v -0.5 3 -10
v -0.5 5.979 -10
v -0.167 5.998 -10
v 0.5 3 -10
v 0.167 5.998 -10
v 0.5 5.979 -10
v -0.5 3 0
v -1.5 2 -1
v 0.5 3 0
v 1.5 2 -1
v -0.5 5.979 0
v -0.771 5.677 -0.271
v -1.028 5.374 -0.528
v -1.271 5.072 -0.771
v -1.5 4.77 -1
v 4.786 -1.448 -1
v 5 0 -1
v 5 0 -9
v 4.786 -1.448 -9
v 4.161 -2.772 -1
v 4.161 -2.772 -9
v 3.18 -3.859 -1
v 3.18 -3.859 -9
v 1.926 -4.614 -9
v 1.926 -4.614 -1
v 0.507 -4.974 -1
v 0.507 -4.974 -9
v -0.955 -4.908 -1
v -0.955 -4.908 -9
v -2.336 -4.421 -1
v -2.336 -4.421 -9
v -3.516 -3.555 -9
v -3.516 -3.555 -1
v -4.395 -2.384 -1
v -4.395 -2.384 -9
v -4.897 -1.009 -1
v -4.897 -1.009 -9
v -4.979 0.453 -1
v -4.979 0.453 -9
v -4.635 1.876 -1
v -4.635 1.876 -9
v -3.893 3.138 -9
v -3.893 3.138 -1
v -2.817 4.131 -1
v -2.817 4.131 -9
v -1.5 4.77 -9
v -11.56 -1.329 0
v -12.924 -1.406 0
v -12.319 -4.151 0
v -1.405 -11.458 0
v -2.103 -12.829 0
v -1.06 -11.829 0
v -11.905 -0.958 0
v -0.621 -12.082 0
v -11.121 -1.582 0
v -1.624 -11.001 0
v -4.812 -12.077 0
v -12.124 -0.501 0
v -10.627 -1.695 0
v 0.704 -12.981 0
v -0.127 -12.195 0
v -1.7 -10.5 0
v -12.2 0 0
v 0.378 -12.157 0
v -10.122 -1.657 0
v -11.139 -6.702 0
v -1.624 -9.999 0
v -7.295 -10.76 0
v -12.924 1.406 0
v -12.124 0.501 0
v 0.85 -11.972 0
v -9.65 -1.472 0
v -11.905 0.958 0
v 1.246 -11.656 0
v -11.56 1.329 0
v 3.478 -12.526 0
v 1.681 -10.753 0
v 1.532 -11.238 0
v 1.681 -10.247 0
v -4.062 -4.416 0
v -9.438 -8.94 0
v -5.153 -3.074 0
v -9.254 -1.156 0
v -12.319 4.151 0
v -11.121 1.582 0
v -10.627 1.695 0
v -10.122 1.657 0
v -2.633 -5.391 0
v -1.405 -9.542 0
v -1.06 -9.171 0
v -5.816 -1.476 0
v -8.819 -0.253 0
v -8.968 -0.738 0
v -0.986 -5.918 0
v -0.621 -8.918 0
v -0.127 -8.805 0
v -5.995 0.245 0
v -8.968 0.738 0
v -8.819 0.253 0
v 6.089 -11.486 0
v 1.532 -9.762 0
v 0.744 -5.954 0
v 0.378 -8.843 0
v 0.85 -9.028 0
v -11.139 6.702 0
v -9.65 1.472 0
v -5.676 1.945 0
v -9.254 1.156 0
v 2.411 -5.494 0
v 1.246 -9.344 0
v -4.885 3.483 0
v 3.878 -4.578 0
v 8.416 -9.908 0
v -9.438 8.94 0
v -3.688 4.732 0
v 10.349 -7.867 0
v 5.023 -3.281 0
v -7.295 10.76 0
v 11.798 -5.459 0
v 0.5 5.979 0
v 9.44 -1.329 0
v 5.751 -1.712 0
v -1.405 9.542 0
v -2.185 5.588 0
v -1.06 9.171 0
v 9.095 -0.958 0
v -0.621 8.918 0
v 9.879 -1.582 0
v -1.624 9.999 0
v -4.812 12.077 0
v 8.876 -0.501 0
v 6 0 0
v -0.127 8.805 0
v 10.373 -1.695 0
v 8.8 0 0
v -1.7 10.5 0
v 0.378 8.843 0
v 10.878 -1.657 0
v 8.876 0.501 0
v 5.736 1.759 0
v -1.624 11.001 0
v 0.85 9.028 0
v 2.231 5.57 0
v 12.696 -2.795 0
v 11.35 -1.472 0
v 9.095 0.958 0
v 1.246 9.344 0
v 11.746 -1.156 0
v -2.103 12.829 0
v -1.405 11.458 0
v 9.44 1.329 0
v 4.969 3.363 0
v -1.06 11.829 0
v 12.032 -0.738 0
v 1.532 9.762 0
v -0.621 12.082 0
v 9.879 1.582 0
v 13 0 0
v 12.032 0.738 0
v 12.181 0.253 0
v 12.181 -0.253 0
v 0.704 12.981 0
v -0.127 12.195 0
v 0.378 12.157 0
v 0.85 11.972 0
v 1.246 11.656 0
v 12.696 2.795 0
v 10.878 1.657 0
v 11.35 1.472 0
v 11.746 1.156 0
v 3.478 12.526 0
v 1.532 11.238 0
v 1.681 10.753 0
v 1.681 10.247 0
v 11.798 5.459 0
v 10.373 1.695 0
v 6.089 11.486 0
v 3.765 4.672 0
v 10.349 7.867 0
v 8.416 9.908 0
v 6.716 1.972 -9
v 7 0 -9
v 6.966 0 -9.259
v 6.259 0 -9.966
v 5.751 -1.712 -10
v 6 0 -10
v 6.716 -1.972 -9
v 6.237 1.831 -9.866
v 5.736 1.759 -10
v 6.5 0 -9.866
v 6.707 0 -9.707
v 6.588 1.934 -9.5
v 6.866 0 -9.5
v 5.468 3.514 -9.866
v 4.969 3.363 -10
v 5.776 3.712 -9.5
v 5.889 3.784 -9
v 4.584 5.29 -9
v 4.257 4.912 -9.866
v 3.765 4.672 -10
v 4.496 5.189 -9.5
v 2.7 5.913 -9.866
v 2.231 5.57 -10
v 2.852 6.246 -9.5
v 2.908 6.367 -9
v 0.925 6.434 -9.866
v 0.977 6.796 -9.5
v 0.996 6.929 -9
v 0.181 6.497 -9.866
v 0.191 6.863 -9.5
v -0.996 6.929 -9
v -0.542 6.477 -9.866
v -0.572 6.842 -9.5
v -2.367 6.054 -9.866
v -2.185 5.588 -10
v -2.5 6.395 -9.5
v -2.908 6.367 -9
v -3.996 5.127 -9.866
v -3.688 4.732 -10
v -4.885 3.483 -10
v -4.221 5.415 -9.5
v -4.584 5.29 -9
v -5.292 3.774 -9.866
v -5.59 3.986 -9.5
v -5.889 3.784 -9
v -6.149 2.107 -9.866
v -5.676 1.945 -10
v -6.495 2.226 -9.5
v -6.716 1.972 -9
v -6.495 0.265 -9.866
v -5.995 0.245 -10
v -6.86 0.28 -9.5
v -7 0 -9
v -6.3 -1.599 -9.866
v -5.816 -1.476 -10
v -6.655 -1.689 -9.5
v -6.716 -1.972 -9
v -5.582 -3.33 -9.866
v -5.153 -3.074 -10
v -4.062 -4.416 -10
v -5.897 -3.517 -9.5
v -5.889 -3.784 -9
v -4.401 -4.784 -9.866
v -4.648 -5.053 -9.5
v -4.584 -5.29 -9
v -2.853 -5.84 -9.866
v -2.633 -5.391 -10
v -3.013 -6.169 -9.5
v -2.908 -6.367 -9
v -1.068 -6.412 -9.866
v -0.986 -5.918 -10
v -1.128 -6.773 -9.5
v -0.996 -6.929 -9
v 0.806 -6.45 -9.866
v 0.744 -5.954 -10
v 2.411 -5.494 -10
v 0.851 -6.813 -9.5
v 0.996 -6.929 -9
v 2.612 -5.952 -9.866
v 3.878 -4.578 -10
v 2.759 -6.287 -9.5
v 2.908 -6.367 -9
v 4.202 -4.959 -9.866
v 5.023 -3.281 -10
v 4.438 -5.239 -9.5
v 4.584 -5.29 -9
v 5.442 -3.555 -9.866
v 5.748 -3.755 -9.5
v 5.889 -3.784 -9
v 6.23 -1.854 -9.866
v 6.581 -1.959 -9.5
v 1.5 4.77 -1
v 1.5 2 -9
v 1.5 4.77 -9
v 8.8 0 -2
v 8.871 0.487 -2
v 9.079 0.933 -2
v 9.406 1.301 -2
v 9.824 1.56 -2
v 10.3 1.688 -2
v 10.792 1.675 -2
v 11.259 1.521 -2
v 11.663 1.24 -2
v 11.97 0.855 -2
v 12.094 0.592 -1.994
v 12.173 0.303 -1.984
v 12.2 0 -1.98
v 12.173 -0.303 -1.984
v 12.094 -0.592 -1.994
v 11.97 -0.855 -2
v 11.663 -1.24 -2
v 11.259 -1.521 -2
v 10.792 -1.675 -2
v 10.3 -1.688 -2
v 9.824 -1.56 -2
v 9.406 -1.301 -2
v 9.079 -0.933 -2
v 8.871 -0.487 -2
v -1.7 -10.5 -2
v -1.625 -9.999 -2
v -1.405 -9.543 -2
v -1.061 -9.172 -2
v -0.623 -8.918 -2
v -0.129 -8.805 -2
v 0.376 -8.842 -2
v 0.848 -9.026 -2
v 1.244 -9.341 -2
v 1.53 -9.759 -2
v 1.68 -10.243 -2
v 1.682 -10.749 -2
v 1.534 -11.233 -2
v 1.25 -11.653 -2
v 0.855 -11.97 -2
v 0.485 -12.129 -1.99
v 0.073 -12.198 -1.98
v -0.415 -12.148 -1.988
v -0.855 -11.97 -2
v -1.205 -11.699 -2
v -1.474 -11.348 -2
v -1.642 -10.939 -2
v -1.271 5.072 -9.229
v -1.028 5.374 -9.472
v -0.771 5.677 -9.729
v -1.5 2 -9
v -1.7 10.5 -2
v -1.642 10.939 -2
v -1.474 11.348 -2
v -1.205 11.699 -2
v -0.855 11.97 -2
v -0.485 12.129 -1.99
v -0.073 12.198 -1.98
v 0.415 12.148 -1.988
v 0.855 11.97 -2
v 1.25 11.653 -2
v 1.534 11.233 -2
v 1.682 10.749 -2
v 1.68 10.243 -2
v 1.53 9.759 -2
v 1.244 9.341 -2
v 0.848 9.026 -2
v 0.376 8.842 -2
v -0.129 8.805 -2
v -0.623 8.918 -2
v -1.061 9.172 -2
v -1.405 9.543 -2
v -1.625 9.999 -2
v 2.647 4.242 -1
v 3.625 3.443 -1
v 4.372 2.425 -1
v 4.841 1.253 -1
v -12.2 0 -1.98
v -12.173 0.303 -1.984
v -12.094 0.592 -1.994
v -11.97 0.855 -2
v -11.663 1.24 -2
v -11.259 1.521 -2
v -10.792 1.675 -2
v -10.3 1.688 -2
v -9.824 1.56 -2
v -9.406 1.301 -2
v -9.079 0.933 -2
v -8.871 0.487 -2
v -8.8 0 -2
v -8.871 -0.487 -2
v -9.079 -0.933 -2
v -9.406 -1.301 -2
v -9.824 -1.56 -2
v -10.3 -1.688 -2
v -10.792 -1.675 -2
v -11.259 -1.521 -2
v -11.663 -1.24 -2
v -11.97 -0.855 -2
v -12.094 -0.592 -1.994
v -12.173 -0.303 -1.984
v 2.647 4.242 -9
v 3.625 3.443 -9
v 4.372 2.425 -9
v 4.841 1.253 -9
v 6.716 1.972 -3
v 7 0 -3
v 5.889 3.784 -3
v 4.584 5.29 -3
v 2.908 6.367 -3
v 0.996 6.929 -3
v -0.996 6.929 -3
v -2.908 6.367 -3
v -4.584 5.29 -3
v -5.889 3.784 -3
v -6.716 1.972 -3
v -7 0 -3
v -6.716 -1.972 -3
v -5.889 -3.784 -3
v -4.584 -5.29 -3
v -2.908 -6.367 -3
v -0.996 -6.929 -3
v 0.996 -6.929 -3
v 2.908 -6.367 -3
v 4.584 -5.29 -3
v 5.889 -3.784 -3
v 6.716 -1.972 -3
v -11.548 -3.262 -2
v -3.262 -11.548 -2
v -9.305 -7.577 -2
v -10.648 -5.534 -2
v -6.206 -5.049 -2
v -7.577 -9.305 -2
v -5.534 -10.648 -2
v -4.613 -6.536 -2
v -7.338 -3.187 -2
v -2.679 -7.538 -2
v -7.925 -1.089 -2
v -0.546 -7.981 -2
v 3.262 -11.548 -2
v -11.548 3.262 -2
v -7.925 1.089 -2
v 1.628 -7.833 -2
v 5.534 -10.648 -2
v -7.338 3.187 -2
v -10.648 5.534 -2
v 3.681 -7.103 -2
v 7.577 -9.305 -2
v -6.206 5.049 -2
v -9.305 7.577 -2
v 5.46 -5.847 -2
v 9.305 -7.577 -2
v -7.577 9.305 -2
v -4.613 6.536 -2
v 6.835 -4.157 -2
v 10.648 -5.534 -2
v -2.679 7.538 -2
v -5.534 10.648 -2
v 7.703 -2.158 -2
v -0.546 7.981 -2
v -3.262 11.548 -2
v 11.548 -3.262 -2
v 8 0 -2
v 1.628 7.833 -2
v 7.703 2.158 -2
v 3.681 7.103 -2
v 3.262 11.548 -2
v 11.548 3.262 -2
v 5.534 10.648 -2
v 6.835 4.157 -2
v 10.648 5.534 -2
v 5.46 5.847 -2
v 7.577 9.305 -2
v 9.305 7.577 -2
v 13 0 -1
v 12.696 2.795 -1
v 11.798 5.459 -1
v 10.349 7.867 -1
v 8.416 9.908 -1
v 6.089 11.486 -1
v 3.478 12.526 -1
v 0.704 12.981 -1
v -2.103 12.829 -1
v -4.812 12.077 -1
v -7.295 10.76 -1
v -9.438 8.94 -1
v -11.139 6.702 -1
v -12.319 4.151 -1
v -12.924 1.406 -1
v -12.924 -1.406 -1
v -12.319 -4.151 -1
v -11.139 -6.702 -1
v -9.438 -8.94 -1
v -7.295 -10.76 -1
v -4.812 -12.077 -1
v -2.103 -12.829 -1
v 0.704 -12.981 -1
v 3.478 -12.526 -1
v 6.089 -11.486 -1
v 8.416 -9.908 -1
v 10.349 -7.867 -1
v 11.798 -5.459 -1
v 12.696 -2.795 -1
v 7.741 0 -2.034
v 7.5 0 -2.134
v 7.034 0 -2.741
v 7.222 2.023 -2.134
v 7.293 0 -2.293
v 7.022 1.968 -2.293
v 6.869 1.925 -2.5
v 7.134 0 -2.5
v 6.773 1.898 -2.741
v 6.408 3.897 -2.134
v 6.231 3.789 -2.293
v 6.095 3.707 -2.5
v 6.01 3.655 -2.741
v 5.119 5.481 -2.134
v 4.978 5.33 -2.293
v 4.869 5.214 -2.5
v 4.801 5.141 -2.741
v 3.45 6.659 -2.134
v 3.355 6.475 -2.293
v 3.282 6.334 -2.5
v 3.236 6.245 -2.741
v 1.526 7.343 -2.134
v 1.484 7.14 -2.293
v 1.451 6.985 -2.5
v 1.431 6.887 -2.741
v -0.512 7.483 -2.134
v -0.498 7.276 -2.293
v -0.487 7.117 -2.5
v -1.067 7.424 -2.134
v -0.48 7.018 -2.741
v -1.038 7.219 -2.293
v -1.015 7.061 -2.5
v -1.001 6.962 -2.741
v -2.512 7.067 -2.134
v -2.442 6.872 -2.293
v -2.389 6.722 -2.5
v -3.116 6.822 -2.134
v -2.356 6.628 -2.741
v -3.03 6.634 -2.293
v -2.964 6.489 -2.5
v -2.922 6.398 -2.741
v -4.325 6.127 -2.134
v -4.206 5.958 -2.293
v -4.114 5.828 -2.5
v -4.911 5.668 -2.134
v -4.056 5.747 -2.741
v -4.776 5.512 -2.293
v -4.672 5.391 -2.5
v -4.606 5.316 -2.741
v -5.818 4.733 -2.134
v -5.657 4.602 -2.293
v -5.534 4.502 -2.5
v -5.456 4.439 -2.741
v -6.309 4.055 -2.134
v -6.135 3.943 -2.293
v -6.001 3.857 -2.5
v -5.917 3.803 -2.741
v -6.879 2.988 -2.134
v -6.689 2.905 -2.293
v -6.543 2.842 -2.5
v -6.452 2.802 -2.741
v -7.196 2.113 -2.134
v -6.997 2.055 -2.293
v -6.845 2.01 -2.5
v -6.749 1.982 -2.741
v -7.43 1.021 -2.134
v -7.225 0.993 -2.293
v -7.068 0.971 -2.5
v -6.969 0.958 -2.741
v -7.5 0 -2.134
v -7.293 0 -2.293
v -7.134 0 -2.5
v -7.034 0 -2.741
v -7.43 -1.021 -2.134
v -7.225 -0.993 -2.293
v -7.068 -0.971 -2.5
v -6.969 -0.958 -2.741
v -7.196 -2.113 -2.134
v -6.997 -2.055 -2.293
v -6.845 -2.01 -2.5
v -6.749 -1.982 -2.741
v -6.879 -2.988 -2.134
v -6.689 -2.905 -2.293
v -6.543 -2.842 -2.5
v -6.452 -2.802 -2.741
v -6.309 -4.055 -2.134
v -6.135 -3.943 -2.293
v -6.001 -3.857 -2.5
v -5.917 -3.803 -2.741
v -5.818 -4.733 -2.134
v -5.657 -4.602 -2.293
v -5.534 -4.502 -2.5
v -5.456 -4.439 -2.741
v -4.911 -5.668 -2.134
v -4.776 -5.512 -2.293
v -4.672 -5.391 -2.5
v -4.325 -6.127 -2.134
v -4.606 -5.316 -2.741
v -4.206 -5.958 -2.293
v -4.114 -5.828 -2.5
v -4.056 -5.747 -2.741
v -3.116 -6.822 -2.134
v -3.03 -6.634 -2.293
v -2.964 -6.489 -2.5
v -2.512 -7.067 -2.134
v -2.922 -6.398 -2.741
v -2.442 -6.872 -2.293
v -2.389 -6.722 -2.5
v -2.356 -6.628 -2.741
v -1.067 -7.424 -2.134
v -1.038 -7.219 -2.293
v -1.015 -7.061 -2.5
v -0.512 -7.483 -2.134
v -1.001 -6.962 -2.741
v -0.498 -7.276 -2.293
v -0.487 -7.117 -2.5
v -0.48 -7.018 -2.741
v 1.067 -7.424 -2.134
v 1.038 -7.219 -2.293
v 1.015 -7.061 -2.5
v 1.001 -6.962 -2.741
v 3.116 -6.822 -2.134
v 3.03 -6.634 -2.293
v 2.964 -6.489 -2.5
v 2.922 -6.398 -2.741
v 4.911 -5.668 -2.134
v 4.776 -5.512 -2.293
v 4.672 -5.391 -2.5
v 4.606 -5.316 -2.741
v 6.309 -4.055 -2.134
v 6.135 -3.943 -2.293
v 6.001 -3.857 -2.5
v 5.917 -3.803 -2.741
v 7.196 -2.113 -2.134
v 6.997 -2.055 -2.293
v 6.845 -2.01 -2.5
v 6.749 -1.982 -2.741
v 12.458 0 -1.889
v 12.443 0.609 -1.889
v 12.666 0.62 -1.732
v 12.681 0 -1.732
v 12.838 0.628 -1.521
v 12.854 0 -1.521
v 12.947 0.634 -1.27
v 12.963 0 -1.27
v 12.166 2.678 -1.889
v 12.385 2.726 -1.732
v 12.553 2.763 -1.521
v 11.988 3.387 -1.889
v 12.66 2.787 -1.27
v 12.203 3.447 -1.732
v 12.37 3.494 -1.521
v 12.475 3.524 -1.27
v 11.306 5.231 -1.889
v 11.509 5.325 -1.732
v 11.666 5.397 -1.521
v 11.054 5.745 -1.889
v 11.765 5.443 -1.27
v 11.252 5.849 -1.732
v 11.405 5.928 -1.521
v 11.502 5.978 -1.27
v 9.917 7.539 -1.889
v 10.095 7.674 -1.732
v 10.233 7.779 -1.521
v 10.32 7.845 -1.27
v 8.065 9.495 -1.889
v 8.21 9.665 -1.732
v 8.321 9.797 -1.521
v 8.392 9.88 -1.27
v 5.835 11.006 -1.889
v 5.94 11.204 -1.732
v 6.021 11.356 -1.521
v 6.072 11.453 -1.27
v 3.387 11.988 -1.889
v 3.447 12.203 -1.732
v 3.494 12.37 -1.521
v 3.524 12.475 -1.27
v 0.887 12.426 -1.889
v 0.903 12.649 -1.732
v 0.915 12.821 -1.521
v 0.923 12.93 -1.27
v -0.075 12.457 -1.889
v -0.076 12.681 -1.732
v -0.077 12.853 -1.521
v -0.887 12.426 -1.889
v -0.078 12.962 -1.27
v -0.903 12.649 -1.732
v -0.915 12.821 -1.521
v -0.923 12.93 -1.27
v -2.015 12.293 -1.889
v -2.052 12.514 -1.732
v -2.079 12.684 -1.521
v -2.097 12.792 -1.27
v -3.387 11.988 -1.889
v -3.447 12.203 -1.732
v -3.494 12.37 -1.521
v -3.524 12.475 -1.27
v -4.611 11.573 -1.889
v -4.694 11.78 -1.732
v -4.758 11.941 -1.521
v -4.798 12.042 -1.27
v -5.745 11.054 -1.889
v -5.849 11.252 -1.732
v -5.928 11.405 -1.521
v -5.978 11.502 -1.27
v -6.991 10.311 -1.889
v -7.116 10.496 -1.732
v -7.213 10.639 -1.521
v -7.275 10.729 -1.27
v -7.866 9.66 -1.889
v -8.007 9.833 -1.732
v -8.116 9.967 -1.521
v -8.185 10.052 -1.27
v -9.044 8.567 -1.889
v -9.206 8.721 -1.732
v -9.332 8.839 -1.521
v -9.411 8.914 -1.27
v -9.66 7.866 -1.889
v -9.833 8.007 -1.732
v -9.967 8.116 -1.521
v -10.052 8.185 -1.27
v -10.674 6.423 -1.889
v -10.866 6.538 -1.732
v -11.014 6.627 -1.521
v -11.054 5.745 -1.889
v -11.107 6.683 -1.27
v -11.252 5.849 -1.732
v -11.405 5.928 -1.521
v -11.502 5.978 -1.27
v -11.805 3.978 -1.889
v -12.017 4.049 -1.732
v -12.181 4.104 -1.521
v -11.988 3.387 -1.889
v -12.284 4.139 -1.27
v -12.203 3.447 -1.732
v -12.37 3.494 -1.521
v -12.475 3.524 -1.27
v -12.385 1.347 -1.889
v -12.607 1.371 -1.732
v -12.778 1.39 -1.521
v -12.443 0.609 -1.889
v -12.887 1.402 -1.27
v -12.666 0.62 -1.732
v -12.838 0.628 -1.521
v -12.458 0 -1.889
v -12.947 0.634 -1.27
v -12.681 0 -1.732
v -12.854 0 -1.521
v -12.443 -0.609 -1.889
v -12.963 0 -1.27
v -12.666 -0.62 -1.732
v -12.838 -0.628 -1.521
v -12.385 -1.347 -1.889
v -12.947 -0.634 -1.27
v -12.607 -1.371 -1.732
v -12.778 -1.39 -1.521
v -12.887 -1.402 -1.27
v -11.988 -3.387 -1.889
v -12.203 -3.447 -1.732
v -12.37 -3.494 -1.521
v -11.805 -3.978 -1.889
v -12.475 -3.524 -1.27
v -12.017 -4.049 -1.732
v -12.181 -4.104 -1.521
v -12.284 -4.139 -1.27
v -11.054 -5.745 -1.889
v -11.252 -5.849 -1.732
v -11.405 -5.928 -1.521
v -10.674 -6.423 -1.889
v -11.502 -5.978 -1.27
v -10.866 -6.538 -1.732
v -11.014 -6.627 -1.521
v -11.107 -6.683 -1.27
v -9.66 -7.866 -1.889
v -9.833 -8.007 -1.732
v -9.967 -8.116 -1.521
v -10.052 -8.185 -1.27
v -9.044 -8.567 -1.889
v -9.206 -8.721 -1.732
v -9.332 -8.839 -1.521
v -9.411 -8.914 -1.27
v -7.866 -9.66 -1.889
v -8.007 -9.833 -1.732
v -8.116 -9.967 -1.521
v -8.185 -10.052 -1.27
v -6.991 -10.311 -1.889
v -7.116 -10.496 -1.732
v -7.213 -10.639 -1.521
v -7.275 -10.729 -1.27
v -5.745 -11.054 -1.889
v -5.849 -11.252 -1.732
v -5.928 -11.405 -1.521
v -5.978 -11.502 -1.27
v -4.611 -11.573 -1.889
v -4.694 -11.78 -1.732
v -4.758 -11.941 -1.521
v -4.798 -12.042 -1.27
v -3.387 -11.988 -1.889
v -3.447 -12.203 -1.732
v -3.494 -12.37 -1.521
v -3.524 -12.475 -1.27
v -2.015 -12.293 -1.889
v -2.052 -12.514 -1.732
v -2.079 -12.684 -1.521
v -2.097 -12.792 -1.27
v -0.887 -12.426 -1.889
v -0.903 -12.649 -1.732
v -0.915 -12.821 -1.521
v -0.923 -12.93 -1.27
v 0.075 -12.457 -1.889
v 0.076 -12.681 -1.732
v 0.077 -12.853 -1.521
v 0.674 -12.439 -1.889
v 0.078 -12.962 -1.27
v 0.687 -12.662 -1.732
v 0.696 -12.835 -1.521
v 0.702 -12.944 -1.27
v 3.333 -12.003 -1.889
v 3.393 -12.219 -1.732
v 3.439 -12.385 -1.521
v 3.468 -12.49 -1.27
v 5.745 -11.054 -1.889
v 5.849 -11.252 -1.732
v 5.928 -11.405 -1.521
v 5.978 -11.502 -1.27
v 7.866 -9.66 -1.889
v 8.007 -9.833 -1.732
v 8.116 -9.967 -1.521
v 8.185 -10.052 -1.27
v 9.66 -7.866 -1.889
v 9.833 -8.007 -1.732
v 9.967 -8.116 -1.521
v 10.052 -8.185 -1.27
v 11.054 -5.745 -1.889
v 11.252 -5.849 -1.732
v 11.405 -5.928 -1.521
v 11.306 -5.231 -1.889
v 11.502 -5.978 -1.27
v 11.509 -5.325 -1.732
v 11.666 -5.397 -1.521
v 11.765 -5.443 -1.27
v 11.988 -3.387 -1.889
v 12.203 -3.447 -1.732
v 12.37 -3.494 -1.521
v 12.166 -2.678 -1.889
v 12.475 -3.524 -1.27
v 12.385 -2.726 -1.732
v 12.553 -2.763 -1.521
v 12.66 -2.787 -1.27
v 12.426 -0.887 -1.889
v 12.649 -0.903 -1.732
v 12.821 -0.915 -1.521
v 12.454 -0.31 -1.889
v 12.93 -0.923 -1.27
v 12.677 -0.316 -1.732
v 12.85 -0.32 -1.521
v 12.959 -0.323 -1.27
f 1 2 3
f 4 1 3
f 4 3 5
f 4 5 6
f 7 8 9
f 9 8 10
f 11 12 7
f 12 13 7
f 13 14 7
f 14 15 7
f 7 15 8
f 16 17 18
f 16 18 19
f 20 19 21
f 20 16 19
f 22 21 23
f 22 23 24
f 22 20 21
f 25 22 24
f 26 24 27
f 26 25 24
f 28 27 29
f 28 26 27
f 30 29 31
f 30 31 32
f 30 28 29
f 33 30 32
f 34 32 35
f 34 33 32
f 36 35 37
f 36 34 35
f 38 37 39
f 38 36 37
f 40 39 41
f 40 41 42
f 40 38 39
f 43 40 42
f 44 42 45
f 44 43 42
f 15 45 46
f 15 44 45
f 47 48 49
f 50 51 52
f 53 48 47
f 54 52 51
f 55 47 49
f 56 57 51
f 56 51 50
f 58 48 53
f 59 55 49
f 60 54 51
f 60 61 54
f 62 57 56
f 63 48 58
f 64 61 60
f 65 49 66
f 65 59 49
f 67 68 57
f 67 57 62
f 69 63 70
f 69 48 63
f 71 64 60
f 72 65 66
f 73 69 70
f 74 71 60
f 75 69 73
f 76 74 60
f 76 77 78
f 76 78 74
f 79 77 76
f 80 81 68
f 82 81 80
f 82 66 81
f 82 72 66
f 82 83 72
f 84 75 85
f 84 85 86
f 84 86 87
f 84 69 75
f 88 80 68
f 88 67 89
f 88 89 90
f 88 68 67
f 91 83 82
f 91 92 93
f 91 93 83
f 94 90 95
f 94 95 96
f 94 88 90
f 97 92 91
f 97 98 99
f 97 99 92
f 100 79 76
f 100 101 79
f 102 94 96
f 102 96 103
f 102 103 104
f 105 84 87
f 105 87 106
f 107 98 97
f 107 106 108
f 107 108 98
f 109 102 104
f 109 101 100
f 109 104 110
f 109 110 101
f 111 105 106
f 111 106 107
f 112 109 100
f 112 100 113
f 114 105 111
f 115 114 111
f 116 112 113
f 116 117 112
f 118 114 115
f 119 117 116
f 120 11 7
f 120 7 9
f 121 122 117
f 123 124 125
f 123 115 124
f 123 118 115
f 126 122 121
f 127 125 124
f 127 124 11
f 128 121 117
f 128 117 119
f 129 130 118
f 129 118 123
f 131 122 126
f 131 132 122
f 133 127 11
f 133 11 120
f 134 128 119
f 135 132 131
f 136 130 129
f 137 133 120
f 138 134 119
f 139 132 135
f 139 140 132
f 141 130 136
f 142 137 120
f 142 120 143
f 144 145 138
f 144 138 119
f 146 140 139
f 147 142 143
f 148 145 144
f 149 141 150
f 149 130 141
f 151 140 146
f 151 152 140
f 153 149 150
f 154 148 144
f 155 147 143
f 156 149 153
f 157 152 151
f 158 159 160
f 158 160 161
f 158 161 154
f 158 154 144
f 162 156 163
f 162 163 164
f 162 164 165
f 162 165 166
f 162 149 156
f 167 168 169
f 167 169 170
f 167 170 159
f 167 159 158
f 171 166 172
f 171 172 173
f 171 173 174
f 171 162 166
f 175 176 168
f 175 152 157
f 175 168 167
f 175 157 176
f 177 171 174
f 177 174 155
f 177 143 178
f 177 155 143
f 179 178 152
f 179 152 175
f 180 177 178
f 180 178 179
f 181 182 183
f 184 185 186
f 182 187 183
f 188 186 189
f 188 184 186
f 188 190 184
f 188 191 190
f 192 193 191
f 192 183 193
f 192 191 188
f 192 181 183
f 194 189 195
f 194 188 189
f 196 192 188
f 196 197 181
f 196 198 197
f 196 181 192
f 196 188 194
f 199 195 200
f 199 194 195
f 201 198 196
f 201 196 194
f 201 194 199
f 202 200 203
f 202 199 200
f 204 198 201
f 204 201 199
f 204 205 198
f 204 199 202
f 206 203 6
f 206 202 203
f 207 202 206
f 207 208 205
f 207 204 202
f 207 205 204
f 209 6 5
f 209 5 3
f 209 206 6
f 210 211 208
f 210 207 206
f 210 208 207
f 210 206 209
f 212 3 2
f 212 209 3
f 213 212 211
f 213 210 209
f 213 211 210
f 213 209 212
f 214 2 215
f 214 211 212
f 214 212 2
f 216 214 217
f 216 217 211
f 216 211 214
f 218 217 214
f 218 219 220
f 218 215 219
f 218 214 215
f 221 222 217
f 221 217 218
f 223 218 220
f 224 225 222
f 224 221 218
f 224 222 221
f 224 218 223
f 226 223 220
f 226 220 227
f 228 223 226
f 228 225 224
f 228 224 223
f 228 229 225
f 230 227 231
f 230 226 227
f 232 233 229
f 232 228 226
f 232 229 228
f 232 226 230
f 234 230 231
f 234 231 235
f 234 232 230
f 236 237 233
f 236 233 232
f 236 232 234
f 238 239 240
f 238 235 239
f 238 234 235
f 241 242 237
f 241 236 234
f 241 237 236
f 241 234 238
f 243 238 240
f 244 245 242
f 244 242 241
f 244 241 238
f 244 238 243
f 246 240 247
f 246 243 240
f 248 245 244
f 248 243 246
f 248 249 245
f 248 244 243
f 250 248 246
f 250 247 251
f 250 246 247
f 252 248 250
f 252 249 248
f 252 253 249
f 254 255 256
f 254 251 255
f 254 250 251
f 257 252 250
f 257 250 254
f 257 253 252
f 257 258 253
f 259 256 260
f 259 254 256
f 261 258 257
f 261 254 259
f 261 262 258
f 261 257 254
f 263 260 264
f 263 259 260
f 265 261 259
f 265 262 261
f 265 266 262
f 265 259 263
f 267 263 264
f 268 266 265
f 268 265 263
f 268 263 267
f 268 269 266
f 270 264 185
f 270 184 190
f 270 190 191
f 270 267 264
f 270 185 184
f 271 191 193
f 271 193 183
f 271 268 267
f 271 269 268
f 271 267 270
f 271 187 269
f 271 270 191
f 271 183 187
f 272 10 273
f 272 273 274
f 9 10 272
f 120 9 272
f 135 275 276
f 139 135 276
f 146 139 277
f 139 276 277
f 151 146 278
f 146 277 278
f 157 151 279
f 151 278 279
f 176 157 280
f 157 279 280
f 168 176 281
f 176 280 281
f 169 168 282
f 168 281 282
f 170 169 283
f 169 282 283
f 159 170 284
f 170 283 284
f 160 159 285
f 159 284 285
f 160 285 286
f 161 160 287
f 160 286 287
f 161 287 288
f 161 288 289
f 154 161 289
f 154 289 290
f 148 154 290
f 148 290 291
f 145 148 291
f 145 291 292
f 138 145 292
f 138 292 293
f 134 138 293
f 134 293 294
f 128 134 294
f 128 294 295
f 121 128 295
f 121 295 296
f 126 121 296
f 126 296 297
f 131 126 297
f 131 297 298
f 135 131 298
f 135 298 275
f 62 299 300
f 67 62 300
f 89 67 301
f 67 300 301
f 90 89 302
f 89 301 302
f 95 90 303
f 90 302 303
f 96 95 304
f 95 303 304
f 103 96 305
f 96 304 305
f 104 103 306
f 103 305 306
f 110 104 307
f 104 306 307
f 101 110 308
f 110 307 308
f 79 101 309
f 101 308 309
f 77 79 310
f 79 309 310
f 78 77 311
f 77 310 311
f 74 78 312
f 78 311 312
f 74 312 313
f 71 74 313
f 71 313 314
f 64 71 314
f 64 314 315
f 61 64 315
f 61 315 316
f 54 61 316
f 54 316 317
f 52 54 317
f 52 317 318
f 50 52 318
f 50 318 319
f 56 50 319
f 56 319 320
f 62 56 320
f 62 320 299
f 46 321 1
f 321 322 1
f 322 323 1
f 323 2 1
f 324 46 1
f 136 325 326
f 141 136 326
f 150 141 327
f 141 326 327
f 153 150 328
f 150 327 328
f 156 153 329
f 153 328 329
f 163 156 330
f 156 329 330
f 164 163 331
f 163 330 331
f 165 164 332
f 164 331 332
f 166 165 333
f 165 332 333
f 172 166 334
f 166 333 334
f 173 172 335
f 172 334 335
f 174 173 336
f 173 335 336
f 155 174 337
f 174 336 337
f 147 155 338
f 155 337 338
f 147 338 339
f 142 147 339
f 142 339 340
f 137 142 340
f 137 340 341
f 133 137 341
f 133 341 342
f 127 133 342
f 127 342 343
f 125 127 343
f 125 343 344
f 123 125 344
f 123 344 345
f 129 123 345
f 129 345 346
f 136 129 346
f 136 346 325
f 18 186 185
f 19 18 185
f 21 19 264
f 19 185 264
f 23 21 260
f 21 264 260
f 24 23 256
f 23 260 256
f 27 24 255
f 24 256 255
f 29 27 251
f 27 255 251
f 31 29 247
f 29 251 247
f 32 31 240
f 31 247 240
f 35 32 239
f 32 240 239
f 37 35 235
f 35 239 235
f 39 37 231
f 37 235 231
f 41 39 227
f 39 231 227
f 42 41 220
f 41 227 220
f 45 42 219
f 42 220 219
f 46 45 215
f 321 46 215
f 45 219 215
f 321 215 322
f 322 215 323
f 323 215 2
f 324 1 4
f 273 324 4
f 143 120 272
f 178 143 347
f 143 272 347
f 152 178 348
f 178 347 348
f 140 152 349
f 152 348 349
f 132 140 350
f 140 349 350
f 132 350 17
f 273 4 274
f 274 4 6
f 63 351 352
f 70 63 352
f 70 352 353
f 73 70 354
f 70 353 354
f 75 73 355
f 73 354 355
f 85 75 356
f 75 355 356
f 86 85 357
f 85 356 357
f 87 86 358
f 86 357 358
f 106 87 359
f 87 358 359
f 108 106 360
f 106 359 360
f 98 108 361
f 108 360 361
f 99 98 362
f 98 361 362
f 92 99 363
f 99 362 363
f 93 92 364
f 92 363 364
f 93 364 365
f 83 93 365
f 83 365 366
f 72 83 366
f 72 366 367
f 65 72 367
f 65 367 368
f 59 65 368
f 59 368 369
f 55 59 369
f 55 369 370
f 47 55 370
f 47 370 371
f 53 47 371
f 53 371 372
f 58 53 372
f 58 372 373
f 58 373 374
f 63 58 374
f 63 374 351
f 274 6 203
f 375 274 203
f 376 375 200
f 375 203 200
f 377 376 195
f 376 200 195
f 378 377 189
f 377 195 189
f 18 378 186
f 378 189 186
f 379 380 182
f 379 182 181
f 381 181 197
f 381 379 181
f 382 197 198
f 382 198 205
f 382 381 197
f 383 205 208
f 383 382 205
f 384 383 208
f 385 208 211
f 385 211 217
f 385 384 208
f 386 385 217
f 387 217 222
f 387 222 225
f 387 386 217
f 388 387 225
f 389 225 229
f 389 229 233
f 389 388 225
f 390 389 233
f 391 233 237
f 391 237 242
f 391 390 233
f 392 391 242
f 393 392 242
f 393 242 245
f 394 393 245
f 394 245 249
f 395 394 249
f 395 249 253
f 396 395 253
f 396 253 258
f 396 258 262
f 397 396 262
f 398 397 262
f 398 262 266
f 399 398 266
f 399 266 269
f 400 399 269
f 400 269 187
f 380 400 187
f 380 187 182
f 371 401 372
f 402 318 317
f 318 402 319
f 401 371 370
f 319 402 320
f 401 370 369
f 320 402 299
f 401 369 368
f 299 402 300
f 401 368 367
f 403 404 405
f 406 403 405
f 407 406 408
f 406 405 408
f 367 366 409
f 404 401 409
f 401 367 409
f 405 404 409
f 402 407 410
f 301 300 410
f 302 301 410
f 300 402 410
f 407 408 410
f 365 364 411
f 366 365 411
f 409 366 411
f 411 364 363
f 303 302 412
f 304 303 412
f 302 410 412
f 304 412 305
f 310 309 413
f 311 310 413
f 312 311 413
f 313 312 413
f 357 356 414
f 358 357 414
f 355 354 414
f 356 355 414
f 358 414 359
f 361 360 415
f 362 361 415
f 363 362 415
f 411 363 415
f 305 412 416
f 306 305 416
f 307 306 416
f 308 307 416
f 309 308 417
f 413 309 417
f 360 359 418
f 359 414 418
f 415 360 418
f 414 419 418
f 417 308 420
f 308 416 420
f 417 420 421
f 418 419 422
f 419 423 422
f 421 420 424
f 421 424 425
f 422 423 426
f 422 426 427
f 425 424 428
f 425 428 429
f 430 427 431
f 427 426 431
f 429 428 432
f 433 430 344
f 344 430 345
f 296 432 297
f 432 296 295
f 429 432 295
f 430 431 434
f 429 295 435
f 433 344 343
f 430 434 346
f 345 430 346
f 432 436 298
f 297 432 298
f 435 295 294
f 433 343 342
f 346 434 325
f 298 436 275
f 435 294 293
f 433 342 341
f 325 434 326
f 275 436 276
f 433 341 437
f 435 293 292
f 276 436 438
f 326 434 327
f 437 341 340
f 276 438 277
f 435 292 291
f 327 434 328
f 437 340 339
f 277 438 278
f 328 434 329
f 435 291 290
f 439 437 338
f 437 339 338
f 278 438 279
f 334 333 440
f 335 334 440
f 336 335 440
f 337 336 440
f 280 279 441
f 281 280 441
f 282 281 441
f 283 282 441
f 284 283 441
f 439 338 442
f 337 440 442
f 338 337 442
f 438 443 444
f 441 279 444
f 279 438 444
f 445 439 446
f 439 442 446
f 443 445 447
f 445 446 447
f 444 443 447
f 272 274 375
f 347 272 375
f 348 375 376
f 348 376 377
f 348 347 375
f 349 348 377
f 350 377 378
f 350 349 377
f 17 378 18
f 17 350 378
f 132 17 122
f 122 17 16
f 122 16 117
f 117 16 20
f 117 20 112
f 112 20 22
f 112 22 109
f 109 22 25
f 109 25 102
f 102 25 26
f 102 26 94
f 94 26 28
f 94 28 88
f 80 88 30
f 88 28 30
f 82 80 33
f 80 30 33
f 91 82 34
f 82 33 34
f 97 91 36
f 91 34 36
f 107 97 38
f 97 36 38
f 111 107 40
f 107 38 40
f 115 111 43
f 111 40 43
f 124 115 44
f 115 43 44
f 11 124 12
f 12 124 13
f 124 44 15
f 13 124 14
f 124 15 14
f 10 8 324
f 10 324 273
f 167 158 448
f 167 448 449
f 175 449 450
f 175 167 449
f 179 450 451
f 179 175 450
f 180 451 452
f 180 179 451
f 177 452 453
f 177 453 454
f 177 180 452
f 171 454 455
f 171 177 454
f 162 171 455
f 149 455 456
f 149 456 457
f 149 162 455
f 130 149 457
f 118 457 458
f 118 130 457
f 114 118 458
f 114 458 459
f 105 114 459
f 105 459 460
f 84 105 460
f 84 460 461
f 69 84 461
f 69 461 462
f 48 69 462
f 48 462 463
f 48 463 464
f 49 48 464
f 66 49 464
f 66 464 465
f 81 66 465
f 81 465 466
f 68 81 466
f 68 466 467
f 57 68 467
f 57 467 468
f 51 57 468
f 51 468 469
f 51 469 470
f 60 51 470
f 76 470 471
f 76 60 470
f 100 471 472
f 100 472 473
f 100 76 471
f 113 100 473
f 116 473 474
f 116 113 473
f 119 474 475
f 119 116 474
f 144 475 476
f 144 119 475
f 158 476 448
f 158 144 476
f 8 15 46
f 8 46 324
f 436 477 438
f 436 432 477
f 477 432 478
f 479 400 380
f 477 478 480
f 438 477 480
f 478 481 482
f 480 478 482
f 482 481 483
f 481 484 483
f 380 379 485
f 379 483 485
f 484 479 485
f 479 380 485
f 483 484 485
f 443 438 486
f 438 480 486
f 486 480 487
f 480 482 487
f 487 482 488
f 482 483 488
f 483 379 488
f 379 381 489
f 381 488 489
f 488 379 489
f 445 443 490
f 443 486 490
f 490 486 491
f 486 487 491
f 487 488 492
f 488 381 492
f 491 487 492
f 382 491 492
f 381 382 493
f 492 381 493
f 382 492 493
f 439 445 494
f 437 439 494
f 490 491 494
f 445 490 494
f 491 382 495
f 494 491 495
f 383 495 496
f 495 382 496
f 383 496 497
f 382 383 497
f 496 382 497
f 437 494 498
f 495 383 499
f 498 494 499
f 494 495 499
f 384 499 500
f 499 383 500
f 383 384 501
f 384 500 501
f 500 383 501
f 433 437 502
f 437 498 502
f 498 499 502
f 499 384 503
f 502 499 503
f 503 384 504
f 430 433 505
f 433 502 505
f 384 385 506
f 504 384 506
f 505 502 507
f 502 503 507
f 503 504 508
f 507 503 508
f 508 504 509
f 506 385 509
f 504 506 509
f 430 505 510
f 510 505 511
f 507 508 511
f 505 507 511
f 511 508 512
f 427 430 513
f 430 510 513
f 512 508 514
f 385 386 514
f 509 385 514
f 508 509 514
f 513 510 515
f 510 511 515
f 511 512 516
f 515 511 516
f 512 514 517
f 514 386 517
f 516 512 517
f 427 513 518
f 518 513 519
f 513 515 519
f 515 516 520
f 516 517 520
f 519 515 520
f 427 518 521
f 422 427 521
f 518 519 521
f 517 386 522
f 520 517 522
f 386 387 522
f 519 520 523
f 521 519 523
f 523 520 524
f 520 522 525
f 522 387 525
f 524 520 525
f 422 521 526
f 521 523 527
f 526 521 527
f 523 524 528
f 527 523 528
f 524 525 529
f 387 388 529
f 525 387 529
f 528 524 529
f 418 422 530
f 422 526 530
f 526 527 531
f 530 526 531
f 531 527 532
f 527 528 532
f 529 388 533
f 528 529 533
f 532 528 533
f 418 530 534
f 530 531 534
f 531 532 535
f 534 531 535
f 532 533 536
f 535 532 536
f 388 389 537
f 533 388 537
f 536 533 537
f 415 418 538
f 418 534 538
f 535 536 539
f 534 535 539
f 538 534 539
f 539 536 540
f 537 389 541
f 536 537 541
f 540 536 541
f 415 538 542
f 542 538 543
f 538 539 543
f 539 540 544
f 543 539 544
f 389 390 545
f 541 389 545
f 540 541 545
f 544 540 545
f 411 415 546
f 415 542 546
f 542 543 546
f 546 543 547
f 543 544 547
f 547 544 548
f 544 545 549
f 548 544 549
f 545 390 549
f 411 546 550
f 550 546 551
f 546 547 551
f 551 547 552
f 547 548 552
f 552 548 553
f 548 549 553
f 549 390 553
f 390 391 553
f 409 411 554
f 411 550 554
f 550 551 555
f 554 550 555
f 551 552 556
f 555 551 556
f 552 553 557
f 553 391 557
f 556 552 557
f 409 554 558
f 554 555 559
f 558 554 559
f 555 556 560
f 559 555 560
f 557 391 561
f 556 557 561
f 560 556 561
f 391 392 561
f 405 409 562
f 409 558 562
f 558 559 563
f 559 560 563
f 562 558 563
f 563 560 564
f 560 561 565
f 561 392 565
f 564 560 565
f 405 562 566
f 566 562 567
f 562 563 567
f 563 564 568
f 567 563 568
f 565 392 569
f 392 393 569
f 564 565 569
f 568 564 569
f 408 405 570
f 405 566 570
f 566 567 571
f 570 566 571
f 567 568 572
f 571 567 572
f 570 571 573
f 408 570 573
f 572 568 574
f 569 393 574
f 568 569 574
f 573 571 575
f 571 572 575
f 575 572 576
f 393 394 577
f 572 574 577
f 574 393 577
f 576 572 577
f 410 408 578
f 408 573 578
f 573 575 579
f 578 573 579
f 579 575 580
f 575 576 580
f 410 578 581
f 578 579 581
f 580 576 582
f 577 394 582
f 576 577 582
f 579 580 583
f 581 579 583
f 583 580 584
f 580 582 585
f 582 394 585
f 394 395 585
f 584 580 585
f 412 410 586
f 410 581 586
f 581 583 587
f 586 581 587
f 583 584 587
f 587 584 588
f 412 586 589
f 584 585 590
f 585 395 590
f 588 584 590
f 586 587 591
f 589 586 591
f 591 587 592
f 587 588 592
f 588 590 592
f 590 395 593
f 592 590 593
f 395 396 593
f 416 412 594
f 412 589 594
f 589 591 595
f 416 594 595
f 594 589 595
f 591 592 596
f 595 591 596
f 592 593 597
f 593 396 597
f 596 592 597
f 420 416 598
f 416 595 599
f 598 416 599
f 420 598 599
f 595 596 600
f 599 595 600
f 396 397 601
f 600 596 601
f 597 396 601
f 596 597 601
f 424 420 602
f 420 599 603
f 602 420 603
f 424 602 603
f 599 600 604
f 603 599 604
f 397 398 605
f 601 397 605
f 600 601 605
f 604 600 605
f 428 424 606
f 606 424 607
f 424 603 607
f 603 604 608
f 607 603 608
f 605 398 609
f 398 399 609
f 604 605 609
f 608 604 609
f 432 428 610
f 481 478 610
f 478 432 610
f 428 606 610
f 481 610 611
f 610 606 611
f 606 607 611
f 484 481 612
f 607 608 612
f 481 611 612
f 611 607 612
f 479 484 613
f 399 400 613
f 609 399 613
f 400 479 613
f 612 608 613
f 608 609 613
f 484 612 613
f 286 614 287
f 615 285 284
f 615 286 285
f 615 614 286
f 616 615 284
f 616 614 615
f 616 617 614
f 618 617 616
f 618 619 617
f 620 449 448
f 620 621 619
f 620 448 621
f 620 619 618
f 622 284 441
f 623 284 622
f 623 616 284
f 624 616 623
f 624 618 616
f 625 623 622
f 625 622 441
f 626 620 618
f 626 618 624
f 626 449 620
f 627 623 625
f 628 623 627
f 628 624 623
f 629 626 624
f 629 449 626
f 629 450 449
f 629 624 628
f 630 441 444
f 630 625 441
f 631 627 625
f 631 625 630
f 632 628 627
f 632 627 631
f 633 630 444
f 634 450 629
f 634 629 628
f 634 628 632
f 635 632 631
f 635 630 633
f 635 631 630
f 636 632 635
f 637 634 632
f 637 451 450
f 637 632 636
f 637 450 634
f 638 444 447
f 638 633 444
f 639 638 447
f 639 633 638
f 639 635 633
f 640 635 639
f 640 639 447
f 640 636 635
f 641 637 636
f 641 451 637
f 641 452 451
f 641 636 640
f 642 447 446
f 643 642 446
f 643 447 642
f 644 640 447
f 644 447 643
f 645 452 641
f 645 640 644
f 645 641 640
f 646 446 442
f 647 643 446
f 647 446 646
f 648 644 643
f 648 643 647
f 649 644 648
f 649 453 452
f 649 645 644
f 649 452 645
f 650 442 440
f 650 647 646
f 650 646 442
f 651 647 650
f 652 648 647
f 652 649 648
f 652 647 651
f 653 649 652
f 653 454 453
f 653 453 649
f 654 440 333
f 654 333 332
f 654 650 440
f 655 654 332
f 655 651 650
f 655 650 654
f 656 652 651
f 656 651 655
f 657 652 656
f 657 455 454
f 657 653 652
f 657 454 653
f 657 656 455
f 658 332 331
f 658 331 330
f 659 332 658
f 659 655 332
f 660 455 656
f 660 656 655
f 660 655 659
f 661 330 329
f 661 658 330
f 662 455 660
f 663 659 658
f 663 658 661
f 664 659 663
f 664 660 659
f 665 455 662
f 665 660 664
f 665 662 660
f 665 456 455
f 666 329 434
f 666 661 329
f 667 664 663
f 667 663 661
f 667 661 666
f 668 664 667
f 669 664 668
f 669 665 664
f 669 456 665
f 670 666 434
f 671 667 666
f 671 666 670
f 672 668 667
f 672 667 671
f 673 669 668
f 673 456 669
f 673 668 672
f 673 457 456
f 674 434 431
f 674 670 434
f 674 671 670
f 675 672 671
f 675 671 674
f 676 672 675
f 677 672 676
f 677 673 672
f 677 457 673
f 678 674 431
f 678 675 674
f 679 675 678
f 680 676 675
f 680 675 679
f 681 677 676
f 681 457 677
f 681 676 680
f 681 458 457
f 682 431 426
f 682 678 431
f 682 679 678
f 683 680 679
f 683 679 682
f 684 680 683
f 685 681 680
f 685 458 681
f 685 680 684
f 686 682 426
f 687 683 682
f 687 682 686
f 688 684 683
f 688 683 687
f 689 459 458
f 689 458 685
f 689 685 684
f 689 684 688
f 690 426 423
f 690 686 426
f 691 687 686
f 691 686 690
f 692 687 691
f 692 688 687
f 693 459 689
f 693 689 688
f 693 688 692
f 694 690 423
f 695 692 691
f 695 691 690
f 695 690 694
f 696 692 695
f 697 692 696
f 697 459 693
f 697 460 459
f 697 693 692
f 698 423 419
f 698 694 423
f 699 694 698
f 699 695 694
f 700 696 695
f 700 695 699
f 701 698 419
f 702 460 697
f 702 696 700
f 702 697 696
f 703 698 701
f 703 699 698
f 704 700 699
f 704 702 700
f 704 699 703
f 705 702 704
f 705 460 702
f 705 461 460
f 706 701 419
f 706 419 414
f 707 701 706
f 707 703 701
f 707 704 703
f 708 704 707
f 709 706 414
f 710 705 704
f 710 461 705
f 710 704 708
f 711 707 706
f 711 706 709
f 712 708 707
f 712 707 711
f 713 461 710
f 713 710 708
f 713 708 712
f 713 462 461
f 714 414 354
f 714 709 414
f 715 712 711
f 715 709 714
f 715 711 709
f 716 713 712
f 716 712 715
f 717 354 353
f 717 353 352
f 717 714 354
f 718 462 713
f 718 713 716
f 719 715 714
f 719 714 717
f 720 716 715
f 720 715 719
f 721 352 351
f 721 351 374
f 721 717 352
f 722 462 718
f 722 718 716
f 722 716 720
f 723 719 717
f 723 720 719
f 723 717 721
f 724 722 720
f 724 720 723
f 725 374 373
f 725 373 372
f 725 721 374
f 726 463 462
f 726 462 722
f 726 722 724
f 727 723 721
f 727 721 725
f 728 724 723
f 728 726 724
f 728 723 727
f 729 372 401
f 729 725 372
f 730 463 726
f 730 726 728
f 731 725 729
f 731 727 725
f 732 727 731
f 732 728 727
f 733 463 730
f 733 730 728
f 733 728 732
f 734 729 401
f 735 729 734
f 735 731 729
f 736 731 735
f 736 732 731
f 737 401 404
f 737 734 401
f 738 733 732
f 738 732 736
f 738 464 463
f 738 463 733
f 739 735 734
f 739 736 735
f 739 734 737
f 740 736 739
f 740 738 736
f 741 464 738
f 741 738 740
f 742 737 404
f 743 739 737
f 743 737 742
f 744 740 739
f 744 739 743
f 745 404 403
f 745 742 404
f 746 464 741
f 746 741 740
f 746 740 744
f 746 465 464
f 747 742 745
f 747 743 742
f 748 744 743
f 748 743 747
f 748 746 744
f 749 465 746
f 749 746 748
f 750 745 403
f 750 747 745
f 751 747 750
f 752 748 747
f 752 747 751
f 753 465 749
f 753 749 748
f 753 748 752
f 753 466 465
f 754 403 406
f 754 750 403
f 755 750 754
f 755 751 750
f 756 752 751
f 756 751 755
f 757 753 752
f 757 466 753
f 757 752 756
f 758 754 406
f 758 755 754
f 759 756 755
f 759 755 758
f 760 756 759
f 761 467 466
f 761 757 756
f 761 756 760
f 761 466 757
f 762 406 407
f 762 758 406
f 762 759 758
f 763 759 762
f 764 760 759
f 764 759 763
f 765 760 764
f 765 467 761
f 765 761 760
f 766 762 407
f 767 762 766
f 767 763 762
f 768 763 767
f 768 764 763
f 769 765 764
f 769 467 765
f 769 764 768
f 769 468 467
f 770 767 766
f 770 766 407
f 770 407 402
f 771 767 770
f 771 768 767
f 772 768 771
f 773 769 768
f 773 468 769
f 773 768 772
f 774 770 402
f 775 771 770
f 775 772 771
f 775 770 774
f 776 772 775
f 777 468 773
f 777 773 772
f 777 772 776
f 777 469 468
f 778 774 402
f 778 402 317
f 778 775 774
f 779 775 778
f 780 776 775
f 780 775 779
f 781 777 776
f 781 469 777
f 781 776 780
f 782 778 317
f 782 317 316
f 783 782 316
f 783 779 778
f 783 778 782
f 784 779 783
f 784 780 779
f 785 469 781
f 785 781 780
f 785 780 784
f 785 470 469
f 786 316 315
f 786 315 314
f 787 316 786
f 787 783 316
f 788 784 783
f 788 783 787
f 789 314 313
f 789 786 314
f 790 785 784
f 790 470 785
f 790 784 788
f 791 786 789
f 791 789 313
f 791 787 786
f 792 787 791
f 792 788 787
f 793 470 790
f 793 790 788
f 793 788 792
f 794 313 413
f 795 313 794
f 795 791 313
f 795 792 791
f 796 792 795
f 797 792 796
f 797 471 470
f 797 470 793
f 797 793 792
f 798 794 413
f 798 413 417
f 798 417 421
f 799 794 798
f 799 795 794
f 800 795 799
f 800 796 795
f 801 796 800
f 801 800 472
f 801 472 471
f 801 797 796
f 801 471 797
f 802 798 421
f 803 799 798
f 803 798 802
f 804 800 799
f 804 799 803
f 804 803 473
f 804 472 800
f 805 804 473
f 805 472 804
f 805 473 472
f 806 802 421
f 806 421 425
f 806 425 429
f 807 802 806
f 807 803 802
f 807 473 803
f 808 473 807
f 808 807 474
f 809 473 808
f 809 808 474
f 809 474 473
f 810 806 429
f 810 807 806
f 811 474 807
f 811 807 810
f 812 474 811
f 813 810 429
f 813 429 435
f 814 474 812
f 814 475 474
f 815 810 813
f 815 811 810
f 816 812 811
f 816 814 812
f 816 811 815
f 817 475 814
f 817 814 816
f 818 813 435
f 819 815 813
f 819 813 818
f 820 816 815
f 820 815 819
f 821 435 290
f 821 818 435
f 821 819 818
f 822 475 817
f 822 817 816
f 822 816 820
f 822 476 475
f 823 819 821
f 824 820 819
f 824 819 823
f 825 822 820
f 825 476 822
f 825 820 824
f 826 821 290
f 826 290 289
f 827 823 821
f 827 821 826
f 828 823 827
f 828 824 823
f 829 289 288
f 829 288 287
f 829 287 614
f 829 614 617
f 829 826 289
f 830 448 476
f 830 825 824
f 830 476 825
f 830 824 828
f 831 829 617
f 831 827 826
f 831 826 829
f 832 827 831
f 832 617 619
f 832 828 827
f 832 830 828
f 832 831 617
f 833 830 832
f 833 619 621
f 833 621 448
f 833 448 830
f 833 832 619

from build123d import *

# Parameters (mm, degrees)
CROQUIS1_R                   = 7
SALIENTE_EXTRUIR1_DEPTH      = 10
CROQUIS1_3_R                 = 13
CROQUIS1_3_R_2               = 7
SALIENTE_EXTRUIR2_DEPTH      = 2
TALADRO_DE_MARGEN_PARA_M31_D = 3.4
CHAFL_N1_SIZE                = 1
REDONDEO2_R                  = 1
CHAFL_N2_SIZE                = 1


with BuildPart() as part:
    # Croquis1 → Saliente-Extruir1 (new body)
    # profile 1 of 5: a face of its own
    with BuildSketch(Plane.XY):
        Circle(CROQUIS1_R)
        with BuildLine():
            Line((-1.5, 5), (0, 5))
            Line((0, 5), (1.5, 5))
            Line((1.5, 5), (1.5, 4.769696007))
            ThreePointArc((1.5, 4.769696007), (4.031128874, 2.958039892), (5, 0))
            ThreePointArc((5, 0), (-2.958039892, -4.031128874), (-1.5, 4.769696007))
            Line((-1.5, 4.769696007), (-1.5, 5))
        make_face(mode=Mode.SUBTRACT)
    # profile 2 of 5: a face of its own
    with BuildSketch(Plane.XY):
        with BuildLine():
            Line((0, 5), (0, 2))
            Line((0, 2), (1.5, 2))
            Line((1.5, 2), (1.5, 4.769696007))
            ThreePointArc((1.5, 4.769696007), (0.758788496, 4.942088629), (0, 5))
        make_face()
    # profile 3 of 5: a face of its own
    with BuildSketch(Plane.XY):
        with BuildLine():
            Line((-1.5, 2), (0, 2))
            Line((0, 2), (0, 5))
            ThreePointArc((0, 5), (-0.758788496, 4.942088629), (-1.5, 4.769696007))
            Line((-1.5, 4.769696007), (-1.5, 2))
        make_face()
    # profile 4 of 5: a face of its own
    with BuildSketch(Plane.XY):
        with BuildLine():
            Line((1.5, 5), (0, 5))
            ThreePointArc((0, 5), (0.758788496, 4.942088629), (1.5, 4.769696007))
            Line((1.5, 4.769696007), (1.5, 5))
        make_face()
    # profile 5 of 5: a face of its own
    with BuildSketch(Plane.XY):
        with BuildLine():
            ThreePointArc((-1.5, 4.769696007), (-0.758788496, 4.942088629), (0, 5))
            Line((0, 5), (-1.5, 5))
            Line((-1.5, 5), (-1.5, 4.769696007))
        make_face()
    extrude(amount=-SALIENTE_EXTRUIR1_DEPTH)

    # Croquis1<3> → Saliente-Extruir2 (add)
    with BuildSketch(Plane.XY):
        Circle(CROQUIS1_3_R)
        Circle(CROQUIS1_3_R_2, mode=Mode.SUBTRACT)
    extrude(amount=-SALIENTE_EXTRUIR2_DEPTH)

    # Taladro de margen para M31 (through all)
    with Locations(Plane.XY):
        with Locations((0, 10.5), (10.5, 0), (0, -10.5), (-10.5, 0), (0, 0)):
            Hole(TALADRO_DE_MARGEN_PARA_M31_D / 2)

    # Chaflán1
    chafl_n1_edges = [part.edges().sort_by_distance(p)[0] for p in [
        (-1.5, 3.384848004, -10),
        (0, 2, -10),
        (1.5, 3.384848004, -10),
        (0, -5, -10),
    ]]
    chamfer(chafl_n1_edges, length=CHAFL_N1_SIZE)

    # Redondeo2
    # the kernel refuses this fillet: 1 mm, written as the material it adds along each edge
    with BuildSketch(Plane(origin=(0, 0, -2), x_dir=(1, 0, 0), z_dir=(0, -1, 0))) as redondeo2_piece_1:
        with BuildLine():
            CenterArc((7 + REDONDEO2_R, -REDONDEO2_R), REDONDEO2_R, 90, 90)
            Line((7 + REDONDEO2_R, 0), (7, 0))
            Line((7, 0), (7, -REDONDEO2_R))
        make_face()
    revolve(axis=Axis((0, 0, -2), (0, 0, 1)))
    # the kernel refuses this fillet: 1 mm, written as the material it takes off along each edge
    with BuildSketch(Plane(origin=(0, 0, -2), x_dir=(1, 0, 0), z_dir=(0, -1, 0))) as redondeo2_2_piece_1:
        with BuildLine():
            CenterArc((13 - REDONDEO2_R, REDONDEO2_R), REDONDEO2_R, 270, 90)
            Line((13, REDONDEO2_R), (13, 0))
            Line((13, 0), (13 - REDONDEO2_R, 0))
        make_face()
    revolve(axis=Axis((0, 0, -2), (0, 0, 1)), mode=Mode.SUBTRACT)
    with BuildSketch(Plane(origin=(0, 0, -10), x_dir=(1, 0, 0), z_dir=(0, -1, 0))) as redondeo2_2_piece_2:
        with BuildLine():
            CenterArc((7 - REDONDEO2_R, REDONDEO2_R), REDONDEO2_R, 270, 90)
            Line((7, REDONDEO2_R), (7, 0))
            Line((7, 0), (7 - REDONDEO2_R, 0))
        make_face()
    revolve(axis=Axis((0, 0, -10), (0, 0, 1)), mode=Mode.SUBTRACT)

    # Chaflán2
    chafl_n2_edges = [part.edges().sort_by_distance(p)[0] for p in [
        (1.5, 3.384848004, 0),
        (0, 2, 0),
        (-1.5, 3.384848004, 0),
        (0, -5, 0),
    ]]
    chamfer(chafl_n2_edges, length=CHAFL_N2_SIZE)


solid = part.part
